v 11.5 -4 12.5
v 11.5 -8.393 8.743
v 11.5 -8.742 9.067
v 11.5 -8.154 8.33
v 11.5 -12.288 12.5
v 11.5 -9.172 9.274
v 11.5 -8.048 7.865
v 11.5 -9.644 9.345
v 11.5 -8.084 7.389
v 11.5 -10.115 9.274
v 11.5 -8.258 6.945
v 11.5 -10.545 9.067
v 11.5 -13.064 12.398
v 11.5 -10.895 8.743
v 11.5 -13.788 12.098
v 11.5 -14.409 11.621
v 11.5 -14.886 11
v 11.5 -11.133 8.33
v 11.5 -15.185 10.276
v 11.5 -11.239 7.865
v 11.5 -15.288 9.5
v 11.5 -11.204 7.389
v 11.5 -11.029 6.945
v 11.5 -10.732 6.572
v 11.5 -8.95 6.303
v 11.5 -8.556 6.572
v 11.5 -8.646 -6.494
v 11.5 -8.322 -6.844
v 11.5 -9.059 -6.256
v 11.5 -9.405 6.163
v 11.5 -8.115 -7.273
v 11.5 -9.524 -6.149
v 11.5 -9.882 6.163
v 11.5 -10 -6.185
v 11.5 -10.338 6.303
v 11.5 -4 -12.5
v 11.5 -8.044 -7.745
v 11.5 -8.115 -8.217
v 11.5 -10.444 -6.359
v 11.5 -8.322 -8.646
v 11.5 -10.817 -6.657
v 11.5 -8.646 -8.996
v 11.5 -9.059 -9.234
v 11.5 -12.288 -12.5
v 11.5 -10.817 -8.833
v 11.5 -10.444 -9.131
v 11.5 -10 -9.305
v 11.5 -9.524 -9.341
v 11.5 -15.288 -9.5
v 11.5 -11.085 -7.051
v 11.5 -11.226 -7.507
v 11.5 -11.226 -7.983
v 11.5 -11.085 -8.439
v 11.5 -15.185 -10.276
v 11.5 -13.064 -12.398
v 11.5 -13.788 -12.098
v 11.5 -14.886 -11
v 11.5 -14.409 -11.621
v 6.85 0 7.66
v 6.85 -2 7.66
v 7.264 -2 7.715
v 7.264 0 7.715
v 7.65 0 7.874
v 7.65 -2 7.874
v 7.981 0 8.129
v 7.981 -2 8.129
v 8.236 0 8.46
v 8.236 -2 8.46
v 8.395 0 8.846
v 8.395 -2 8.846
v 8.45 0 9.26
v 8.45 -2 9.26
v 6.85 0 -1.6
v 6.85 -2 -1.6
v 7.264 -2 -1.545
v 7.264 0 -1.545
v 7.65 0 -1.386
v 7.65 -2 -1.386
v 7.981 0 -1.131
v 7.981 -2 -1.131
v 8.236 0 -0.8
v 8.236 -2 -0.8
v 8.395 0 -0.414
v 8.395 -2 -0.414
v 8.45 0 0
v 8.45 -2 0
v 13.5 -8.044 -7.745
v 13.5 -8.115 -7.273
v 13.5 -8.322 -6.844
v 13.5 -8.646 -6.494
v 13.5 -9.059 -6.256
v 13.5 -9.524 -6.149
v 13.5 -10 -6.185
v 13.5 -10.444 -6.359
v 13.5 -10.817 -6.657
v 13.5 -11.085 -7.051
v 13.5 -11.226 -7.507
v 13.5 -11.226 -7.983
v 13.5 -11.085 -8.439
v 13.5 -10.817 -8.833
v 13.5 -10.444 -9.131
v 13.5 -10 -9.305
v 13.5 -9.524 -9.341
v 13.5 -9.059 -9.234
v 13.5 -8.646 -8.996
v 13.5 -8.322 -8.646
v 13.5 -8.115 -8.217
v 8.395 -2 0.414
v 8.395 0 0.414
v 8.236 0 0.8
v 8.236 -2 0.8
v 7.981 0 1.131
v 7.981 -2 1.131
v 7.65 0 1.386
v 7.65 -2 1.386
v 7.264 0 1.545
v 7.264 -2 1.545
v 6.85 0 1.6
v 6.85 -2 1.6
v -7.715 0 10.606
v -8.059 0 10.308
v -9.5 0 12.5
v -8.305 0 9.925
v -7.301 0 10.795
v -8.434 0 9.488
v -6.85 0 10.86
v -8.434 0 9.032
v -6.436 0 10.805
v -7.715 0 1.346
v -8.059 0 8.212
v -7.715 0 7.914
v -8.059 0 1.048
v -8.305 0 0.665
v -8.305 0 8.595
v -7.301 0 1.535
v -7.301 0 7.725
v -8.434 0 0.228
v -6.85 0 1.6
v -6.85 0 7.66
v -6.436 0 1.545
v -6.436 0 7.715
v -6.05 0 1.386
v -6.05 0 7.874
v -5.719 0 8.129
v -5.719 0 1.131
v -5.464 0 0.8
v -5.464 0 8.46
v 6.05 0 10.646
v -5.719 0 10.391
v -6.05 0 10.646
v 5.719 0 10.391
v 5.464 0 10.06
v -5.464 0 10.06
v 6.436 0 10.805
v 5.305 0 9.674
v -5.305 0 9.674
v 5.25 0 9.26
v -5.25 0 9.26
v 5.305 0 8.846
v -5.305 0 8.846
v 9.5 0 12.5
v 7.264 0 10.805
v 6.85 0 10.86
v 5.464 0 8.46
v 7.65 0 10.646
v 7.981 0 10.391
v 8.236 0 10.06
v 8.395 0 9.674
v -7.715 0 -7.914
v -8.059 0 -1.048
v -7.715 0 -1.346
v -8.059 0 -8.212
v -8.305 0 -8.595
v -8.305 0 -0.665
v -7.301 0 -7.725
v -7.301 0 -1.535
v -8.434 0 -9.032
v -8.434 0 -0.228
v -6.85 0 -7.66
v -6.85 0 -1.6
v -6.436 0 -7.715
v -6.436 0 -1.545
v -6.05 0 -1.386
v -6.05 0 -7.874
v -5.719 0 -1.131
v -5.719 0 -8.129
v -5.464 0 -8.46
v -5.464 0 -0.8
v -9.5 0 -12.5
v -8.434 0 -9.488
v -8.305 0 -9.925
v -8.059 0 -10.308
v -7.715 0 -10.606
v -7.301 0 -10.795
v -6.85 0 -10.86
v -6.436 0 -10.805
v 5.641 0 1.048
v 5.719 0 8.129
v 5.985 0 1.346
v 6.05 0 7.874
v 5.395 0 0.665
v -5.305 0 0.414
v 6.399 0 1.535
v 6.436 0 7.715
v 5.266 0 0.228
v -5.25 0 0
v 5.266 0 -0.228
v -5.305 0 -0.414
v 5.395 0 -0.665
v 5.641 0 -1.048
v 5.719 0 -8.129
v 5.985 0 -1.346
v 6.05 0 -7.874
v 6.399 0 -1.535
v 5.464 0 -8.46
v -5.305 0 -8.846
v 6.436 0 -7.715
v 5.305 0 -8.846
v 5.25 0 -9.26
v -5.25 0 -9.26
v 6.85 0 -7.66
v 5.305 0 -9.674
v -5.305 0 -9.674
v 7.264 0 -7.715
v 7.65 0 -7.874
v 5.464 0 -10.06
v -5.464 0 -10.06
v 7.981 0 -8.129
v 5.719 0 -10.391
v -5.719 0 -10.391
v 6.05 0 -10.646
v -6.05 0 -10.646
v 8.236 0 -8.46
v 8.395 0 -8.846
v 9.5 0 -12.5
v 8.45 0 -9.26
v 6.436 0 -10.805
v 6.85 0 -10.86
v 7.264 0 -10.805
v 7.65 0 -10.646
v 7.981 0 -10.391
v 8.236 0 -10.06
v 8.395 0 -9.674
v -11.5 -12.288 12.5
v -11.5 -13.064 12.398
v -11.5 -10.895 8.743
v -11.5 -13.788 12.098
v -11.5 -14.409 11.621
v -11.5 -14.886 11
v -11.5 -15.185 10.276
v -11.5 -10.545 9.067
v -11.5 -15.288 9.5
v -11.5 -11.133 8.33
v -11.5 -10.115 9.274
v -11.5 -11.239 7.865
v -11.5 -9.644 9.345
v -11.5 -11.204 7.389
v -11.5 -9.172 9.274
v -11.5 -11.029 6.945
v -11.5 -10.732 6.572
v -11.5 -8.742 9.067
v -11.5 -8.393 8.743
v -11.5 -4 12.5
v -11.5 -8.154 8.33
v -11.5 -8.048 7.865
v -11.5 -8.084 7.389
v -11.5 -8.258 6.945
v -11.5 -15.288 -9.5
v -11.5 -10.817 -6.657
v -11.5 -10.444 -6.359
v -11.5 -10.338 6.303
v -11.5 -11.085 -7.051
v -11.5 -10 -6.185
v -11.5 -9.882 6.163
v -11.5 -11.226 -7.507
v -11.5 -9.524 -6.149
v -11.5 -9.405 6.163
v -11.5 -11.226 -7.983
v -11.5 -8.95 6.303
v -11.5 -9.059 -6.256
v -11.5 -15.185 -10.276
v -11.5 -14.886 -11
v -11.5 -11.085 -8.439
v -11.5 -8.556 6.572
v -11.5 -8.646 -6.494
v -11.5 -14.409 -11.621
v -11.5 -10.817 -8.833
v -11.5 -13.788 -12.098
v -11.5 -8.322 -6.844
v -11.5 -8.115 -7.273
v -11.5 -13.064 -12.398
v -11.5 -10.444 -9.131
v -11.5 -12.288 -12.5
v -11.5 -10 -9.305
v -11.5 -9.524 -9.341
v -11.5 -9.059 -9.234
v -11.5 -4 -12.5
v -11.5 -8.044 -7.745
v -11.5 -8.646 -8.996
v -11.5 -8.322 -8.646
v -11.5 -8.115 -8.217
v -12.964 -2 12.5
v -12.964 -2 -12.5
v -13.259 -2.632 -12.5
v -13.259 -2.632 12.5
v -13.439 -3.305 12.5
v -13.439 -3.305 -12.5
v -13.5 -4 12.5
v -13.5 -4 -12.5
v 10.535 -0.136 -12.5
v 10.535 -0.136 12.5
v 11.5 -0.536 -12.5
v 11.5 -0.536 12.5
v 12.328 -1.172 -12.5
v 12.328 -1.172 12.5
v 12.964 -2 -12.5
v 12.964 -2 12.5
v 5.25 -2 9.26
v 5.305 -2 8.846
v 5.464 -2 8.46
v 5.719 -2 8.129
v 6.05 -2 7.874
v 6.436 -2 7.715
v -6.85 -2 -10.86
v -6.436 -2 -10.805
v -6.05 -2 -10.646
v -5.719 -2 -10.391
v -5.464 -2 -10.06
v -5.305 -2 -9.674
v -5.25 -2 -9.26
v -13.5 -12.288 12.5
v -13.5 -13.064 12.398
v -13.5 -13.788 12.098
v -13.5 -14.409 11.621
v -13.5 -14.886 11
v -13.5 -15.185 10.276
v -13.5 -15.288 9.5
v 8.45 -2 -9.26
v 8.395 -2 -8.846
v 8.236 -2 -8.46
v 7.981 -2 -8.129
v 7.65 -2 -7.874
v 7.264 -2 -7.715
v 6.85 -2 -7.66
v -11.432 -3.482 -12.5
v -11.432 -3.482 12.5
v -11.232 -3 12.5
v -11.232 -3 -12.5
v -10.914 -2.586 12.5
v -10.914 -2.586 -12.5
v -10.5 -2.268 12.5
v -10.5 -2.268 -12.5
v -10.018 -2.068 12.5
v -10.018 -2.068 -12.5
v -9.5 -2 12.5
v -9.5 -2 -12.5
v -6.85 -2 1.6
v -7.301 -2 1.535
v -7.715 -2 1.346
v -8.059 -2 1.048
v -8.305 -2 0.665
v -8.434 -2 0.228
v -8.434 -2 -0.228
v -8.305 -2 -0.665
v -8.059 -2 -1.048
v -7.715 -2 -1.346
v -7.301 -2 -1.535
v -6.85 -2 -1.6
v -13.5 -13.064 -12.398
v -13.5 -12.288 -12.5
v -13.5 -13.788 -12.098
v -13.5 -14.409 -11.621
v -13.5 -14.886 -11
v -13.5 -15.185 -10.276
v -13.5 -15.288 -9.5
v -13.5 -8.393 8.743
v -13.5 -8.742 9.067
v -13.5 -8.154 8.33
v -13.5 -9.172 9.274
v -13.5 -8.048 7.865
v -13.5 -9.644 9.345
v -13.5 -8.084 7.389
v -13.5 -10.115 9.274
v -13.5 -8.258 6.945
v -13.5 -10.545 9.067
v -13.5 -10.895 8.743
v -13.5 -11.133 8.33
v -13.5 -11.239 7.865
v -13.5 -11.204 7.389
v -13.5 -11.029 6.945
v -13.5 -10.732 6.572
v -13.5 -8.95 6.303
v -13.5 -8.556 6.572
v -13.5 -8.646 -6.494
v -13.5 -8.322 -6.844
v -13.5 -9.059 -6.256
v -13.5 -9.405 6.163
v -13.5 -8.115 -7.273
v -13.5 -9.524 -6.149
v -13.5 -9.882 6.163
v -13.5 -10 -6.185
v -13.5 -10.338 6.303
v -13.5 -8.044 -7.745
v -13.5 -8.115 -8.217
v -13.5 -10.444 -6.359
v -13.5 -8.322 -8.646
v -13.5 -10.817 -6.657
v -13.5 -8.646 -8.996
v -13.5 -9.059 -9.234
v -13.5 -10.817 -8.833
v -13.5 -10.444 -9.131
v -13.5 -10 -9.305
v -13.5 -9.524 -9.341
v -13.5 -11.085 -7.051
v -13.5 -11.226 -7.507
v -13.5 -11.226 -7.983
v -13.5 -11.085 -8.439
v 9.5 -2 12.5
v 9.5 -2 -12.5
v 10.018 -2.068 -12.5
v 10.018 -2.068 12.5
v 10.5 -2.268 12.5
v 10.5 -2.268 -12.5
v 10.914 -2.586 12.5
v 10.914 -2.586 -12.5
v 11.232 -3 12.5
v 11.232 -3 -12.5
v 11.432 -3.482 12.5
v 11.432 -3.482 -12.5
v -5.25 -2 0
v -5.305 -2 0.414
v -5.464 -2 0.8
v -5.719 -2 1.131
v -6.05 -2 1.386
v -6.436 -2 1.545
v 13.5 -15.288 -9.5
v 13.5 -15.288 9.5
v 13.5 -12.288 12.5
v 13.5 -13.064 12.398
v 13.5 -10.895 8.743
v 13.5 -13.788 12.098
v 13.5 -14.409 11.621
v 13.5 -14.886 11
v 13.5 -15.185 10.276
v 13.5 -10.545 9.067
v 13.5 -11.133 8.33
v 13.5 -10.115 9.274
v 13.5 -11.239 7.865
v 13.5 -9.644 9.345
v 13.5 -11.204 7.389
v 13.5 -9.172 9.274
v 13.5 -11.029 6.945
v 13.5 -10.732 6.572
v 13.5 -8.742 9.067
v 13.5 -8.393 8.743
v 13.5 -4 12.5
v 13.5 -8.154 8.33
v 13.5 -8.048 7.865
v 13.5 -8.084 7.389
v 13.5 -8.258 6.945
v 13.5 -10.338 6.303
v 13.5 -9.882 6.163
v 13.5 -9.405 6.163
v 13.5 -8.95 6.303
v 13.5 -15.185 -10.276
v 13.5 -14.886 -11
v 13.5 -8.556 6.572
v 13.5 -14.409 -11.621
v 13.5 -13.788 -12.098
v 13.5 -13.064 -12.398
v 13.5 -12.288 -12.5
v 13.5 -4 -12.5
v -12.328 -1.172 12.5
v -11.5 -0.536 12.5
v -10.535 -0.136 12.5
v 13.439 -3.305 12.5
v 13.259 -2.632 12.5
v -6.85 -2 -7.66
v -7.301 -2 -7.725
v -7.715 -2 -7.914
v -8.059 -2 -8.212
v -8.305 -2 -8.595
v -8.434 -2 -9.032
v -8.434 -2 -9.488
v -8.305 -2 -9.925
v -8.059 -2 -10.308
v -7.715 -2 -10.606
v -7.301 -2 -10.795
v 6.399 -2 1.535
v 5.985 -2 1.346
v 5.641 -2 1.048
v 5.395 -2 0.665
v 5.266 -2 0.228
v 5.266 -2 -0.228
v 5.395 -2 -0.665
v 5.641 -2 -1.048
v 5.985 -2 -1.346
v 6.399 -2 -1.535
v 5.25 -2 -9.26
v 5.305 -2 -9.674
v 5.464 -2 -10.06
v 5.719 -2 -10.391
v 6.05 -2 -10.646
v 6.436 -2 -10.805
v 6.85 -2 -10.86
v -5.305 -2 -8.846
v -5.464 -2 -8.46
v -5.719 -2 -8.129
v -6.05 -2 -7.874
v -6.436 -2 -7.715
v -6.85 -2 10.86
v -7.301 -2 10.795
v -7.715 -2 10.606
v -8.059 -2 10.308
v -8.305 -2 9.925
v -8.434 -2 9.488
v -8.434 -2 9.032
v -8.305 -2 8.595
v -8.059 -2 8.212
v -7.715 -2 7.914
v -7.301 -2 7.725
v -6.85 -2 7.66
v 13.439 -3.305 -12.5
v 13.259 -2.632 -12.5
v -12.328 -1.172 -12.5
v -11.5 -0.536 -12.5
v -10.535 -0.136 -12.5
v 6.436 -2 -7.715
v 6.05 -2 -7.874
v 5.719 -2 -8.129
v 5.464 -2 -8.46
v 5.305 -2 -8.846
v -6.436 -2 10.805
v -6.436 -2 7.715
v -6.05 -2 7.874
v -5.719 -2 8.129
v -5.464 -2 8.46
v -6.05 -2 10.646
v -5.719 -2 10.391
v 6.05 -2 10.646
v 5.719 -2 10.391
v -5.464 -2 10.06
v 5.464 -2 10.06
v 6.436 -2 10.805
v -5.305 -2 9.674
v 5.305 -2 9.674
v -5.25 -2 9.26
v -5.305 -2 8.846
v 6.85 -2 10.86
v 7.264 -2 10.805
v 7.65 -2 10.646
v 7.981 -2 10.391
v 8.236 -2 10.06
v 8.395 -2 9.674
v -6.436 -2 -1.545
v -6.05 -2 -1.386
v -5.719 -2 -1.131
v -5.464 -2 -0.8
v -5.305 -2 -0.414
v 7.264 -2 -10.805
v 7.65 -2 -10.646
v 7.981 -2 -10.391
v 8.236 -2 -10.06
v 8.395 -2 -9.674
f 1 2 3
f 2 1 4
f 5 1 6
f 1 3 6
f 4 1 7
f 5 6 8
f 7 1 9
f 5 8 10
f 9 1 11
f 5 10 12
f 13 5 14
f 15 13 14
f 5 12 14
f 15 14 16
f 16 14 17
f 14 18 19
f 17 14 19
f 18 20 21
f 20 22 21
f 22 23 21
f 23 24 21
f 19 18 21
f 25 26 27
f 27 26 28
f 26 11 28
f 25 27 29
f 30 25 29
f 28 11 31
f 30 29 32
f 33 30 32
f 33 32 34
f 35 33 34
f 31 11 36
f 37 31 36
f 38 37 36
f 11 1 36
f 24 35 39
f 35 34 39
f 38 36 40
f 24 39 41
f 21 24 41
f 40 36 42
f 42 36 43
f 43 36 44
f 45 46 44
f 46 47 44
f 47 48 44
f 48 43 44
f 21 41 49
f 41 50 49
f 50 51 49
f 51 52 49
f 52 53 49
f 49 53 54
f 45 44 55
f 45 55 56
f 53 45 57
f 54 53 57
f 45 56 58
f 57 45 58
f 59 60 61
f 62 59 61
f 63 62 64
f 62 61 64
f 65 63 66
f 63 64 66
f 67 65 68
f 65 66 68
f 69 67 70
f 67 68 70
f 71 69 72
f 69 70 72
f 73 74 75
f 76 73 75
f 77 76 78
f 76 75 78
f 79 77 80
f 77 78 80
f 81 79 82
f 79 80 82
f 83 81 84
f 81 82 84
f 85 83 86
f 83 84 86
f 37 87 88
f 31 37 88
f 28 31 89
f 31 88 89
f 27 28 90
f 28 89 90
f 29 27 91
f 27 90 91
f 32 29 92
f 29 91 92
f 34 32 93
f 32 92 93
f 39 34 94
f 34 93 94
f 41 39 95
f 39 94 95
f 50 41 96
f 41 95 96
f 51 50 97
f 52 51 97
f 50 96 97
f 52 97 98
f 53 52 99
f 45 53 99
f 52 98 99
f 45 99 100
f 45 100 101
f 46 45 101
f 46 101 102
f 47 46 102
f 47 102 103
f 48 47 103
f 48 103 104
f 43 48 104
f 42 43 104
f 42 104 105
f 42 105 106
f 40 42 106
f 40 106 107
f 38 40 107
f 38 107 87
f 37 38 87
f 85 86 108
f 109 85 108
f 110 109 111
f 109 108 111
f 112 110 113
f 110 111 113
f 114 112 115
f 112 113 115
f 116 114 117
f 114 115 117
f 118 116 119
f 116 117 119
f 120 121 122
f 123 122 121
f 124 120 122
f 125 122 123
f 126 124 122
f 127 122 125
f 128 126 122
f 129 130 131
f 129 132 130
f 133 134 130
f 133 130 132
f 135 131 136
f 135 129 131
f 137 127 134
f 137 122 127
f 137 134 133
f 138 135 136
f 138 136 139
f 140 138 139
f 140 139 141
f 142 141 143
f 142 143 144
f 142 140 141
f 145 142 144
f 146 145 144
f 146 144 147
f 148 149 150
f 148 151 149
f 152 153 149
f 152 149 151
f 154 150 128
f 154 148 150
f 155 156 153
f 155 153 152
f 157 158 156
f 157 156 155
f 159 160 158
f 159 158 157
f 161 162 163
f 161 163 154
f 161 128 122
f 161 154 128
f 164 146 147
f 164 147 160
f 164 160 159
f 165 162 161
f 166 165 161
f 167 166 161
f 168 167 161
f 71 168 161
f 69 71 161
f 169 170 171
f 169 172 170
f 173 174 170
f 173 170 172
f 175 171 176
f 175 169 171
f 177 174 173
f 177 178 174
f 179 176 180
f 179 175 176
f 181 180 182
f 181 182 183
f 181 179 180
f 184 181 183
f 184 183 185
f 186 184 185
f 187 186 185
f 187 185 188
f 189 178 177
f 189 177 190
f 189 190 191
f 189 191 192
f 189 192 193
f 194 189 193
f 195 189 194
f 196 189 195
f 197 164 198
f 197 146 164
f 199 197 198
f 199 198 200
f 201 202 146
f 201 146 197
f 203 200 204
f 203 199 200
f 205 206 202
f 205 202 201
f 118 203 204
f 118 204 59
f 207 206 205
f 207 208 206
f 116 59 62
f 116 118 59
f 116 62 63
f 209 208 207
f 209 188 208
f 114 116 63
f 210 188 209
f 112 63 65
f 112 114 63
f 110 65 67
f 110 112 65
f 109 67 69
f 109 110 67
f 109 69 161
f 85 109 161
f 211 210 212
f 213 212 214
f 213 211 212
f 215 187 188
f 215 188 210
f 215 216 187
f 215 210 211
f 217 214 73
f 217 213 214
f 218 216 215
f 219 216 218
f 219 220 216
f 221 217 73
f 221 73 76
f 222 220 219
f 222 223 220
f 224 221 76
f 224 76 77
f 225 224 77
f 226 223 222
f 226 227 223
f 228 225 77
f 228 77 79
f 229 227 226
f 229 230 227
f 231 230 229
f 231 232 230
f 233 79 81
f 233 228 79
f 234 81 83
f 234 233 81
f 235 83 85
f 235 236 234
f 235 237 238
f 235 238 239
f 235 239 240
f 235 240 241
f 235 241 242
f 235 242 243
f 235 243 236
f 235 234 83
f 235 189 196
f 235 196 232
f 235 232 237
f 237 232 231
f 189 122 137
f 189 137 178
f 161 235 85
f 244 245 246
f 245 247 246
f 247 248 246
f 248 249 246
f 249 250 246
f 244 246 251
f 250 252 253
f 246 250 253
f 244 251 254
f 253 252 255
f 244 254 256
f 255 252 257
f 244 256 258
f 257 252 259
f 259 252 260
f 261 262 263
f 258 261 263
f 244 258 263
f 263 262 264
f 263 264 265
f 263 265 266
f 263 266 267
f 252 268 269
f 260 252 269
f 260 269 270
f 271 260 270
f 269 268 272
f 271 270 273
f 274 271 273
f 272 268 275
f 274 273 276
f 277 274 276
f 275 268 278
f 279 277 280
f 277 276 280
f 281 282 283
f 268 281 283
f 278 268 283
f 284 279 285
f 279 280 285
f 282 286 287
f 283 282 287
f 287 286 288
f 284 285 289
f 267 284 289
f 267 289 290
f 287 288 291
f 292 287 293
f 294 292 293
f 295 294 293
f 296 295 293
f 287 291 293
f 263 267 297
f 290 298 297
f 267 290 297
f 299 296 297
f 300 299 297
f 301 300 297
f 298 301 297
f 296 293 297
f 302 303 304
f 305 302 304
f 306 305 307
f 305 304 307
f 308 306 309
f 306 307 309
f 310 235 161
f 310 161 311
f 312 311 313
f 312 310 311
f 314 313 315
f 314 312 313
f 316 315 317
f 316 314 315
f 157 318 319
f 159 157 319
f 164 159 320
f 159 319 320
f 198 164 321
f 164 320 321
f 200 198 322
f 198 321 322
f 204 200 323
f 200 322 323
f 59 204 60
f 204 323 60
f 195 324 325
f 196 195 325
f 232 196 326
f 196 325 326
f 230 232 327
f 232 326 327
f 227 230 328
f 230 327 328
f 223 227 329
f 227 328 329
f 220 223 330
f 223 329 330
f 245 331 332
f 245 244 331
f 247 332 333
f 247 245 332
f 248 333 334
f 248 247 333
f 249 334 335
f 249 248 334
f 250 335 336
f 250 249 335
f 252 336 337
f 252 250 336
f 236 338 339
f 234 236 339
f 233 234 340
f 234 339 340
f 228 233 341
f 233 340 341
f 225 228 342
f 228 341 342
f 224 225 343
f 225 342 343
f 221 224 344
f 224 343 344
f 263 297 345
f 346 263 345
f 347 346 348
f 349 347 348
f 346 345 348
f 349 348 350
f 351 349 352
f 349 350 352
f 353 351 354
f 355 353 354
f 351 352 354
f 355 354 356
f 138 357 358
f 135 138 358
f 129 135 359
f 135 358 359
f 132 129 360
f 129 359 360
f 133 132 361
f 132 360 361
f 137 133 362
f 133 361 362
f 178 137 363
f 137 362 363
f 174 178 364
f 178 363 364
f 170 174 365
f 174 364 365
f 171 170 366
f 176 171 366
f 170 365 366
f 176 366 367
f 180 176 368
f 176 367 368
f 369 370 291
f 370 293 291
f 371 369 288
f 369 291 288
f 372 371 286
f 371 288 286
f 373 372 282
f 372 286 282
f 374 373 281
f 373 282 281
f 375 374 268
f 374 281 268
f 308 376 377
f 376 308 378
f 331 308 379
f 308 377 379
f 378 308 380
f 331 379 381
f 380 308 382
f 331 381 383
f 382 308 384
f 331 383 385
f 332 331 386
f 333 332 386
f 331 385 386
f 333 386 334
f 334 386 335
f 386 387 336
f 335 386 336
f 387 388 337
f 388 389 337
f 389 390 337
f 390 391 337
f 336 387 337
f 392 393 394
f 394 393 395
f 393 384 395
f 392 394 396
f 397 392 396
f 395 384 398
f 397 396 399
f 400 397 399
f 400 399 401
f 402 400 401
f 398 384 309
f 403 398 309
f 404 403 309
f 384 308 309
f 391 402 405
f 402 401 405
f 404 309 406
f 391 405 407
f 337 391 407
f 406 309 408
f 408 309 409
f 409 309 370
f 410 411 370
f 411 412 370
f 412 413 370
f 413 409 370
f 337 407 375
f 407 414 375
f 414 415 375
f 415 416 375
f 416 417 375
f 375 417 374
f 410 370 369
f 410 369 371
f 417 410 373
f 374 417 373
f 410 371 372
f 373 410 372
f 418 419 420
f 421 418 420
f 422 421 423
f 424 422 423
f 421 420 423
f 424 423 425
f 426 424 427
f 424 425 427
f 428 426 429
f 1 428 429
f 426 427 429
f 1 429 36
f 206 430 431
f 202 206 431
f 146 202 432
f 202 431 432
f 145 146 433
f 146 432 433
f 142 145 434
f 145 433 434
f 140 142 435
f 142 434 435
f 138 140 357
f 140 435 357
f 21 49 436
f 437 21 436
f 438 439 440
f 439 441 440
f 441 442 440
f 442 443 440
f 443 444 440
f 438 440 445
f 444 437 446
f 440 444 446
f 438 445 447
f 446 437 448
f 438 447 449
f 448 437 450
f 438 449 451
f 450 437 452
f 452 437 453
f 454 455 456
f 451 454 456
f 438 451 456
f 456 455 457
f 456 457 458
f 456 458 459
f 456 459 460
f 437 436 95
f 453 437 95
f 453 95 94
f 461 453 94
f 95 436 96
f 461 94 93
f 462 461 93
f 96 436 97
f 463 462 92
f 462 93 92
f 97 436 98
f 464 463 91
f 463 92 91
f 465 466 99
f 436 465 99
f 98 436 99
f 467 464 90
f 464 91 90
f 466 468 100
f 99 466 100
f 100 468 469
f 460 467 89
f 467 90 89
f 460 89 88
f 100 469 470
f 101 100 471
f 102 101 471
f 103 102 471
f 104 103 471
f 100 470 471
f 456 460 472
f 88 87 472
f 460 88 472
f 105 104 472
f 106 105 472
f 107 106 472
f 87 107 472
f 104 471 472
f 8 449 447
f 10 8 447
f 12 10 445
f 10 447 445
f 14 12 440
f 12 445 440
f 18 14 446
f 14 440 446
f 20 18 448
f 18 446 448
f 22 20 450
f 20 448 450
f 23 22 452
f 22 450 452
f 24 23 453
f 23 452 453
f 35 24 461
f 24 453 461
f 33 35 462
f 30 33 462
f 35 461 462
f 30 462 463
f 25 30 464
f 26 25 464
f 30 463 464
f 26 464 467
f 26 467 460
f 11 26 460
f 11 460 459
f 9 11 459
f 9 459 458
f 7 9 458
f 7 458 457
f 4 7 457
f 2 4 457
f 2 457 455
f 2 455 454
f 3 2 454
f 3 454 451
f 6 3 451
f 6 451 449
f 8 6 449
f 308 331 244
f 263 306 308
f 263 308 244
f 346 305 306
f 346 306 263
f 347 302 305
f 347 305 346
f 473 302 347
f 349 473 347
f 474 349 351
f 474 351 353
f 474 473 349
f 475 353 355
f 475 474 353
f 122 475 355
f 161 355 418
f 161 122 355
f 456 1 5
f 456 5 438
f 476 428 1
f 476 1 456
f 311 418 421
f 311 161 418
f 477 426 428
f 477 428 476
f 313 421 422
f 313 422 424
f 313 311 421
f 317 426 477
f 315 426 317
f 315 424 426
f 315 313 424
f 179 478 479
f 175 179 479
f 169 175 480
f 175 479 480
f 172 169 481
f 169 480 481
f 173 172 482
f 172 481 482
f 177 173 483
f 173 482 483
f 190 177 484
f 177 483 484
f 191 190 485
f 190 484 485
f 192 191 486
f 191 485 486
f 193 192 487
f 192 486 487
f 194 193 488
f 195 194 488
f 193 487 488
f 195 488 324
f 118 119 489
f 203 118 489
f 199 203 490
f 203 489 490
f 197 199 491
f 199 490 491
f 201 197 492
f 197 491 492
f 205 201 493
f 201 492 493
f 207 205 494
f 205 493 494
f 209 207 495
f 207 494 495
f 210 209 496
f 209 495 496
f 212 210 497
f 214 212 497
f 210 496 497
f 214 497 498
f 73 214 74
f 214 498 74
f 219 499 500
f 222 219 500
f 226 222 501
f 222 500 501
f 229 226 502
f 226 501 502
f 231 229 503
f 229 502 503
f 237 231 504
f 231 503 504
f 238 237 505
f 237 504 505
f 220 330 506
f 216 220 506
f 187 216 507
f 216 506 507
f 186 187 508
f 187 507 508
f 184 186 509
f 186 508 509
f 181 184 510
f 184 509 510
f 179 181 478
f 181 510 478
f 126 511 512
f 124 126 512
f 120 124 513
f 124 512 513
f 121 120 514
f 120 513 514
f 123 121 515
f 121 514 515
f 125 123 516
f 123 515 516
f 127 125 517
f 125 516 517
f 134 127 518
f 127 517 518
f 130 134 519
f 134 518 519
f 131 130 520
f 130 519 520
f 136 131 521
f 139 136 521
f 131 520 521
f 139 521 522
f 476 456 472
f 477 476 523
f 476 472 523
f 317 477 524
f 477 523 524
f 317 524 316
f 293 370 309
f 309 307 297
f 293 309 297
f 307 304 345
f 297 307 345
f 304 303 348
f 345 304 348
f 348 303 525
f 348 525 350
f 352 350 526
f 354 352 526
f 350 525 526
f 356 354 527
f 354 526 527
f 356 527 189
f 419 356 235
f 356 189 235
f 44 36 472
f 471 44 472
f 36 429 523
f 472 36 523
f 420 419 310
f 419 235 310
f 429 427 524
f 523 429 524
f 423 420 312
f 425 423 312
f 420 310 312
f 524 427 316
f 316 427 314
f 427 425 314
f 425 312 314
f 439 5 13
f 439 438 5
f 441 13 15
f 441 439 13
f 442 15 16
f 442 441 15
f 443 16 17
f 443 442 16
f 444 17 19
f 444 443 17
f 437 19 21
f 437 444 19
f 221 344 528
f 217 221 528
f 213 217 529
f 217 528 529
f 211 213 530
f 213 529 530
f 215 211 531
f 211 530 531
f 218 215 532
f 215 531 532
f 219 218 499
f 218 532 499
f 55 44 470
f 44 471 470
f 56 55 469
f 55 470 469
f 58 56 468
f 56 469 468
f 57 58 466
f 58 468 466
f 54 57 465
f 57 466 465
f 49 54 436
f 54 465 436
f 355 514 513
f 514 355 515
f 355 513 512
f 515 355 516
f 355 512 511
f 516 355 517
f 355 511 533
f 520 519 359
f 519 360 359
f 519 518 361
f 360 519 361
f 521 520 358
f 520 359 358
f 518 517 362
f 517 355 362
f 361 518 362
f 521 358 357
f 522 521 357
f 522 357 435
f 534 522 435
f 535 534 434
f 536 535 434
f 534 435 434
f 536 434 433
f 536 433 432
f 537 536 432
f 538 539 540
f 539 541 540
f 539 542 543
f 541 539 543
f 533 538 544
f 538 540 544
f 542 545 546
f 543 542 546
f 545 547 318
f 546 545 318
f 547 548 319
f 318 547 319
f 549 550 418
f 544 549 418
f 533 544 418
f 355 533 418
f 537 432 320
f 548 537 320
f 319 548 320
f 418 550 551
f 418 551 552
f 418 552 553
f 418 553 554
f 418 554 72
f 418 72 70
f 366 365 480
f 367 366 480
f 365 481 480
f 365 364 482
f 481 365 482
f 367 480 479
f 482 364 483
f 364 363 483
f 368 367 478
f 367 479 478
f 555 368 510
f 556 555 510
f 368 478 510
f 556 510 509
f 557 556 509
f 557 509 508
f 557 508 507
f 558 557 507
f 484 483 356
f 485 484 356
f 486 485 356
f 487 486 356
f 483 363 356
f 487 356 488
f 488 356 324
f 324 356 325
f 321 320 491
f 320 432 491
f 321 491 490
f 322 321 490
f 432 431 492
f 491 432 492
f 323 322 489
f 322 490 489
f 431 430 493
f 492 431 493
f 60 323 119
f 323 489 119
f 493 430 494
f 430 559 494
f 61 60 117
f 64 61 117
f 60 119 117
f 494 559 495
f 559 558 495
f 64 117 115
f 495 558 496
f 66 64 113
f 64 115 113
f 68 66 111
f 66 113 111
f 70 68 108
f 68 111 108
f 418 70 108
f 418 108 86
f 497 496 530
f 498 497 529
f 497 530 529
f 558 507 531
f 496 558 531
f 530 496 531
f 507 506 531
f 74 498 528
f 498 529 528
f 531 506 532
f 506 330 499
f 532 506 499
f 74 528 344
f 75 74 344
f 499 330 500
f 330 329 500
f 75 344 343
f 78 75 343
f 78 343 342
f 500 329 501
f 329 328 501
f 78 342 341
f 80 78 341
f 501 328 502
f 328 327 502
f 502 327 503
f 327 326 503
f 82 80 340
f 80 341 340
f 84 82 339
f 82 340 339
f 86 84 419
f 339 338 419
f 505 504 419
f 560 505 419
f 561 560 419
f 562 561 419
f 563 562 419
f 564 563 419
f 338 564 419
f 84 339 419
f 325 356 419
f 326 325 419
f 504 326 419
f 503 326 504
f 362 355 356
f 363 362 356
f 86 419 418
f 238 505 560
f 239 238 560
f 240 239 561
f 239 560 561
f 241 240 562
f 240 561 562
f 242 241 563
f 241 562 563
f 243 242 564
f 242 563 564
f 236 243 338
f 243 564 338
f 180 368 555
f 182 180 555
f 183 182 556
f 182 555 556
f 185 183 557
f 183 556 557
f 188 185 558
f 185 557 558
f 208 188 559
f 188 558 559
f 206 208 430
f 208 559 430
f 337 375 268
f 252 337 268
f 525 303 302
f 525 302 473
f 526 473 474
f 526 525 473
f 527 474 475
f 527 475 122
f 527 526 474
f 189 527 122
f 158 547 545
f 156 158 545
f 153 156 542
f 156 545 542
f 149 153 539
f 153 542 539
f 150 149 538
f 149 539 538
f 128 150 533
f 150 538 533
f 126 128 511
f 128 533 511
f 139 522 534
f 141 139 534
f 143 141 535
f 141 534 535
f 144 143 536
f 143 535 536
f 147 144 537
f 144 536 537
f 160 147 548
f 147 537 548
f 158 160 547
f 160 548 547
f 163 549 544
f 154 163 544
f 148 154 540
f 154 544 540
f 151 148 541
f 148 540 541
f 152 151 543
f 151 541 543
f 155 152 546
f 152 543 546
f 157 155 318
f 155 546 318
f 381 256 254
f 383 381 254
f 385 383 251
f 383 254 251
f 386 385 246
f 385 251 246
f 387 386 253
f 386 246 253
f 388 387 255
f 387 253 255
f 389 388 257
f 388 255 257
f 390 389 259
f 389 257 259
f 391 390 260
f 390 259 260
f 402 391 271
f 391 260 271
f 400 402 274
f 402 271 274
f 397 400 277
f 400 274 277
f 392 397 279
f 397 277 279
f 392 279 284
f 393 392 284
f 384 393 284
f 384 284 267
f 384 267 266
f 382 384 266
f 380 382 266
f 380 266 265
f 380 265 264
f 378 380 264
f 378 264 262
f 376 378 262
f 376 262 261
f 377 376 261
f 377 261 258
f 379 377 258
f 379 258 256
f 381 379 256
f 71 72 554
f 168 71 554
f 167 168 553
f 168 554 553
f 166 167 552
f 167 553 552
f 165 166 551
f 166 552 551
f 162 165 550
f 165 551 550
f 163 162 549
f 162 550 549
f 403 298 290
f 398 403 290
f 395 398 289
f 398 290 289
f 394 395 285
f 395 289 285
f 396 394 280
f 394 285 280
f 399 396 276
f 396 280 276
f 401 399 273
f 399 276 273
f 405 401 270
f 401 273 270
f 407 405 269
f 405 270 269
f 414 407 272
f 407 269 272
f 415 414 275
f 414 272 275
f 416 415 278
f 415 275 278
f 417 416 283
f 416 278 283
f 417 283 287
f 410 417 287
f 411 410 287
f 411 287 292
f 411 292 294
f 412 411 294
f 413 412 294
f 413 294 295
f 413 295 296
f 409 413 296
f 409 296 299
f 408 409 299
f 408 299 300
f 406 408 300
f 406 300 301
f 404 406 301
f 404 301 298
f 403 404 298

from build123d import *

# Parameters (mm, degrees)
SKETCH_1_W             = 51
SKETCH_1_H             = 25
SM_BASE_FLANGE_3_DEPTH = 2
OTHER_START            = -12.5
OTHER_3_DEPTH          = 25
OTHER_3_2_DEPTH        = 25
OTHER_4_DEPTH          = 25
OTHER_4_2_DEPTH        = 25
SKETCH_20_R            = 1.6
CUT_EXTRUDE_1_DEPTH    = 40
CUT_EXTRUDE_2_DEPTH    = 40
FILLET_1_R             = 3


# Read off the part's stored shape, not the designer's step: 绘制的折弯3, 绘制的折弯4
# Sheet-metal steps are written as plain solids
with BuildPart() as part:
    # 草图1 → 基体-法兰3 (new body)
    with BuildSketch(Plane(origin=(0, 0, 0), x_dir=(1, 0, 0), z_dir=(0, 1, 0))):
        Rectangle(SKETCH_1_W, SKETCH_1_H)
    extrude(amount=-SM_BASE_FLANGE_3_DEPTH)

    # Other 3 outline → Other 3 (cut)
    with BuildSketch(Plane.XY.offset(OTHER_START)):
        with BuildLine():
            Line((-25.5, -2), (-12.964101616, -2))
            ThreePointArc((-12.964101616, -2), (-11.5, -0.535898385), (-9.5, 0))
            Line((-9.5, 0), (-25.5, 0))
            Line((-25.5, 0), (-25.5, -2))
        make_face()
    extrude(amount=OTHER_3_DEPTH, mode=Mode.SUBTRACT)

    # Other 3 2 outline → Other 3 2 (add)
    with BuildSketch(Plane.XY.offset(OTHER_START)):
        with BuildLine():
            Line((-13.5, -15.28761102), (-11.5, -15.28761102))
            Line((-11.5, -15.28761102), (-11.5, -4))
            ThreePointArc((-11.5, -4), (-10.914213562, -2.585786438), (-9.5, -2))
            Line((-9.5, -2), (-12.964101616, -2))
            ThreePointArc((-12.964101616, -2), (-13.363703305, -2.96472382), (-13.5, -4))
            Line((-13.5, -4), (-13.5, -15.28761102))
        make_face()
    extrude(amount=OTHER_3_2_DEPTH)

    # Other 4 outline → Other 4 (cut)
    with BuildSketch(Plane.XY.offset(OTHER_START)):
        with BuildLine():
            ThreePointArc((9.5, 0), (11.5, -0.535898385), (12.964101616, -2))
            Line((12.964101616, -2), (25.5, -2))
            Line((25.5, -2), (25.5, 0))
            Line((25.5, 0), (9.5, 0))
        make_face()
    extrude(amount=OTHER_4_DEPTH, mode=Mode.SUBTRACT)

    # Other 4 2 outline → Other 4 2 (add)
    with BuildSketch(Plane.XY.offset(OTHER_START)):
        with BuildLine():
            Line((11.5, -4), (11.5, -15.28761102))
            Line((11.5, -15.28761102), (13.5, -15.28761102))
            Line((13.5, -15.28761102), (13.5, -4))
            ThreePointArc((13.5, -4), (13.363703305, -2.96472382), (12.964101616, -2))
            Line((12.964101616, -2), (9.5, -2))
            ThreePointArc((9.5, -2), (10.914213562, -2.585786438), (11.5, -4))
        make_face()
    extrude(amount=OTHER_4_2_DEPTH)

    # 草图20 → 切除-拉伸1 (cut)
    with BuildSketch(Plane(origin=(13.5, 0, 0), x_dir=(0, 0, -1), z_dir=(1, 0, 0))):
        with BuildLine():
            Line((-9.345, -9.64380551), (-7.745, -9.64380551))
            Line((-7.745, -9.64380551), (-6.145, -9.64380551))
            ThreePointArc((-6.145, -9.64380551), (-7.745, -8.04380551), (-9.345, -9.64380551))
        make_face()
        with BuildLine():
            Line((-6.145, -9.64380551), (-7.745, -9.64380551))
            Line((-7.745, -9.64380551), (-9.345, -9.64380551))
            ThreePointArc((-9.345, -9.64380551), (-7.745, -11.24380551), (-6.145, -9.64380551))
        make_face()
        with Locations(Location((7.745, -9.64380551, 0), (0, 0, 90))):
            Circle(SKETCH_20_R)
    extrude(amount=-CUT_EXTRUDE_1_DEPTH, mode=Mode.SUBTRACT)

    # 草图21 → 切除-拉伸2 (cut)
    with BuildSketch(Plane.XZ.offset(2)):
        with BuildLine():
            ThreePointArc((-5.25, 9.26), (-5.71862915, 10.39137085), (-6.85, 10.86))
            Line((-6.85, 10.86), (-6.85, 9.26))
            Line((-6.85, 9.26), (-5.25, 9.26))
        make_face()
        with BuildLine():
            Line((-5.25, 9.26), (-6.85, 9.26))
            Line((-6.85, 9.26), (-6.85, 7.66))
            ThreePointArc((-6.85, 7.66), (-5.71862915, 8.12862915), (-5.25, 9.26))
        make_face()
        with BuildLine():
            Line((-6.85, 9.26), (-6.85, 10.86))
            ThreePointArc((-6.85, 10.86), (-8.45, 9.26), (-6.85, 7.66))
            Line((-6.85, 7.66), (-6.85, 9.26))
        make_face()
        with BuildLine():
            Line((6.85, 9.26), (6.85, 10.86))
            ThreePointArc((6.85, 10.86), (5.71862915, 10.39137085), (5.25, 9.26))
            Line((5.25, 9.26), (6.85, 9.26))
        make_face()
        with BuildLine():
            Line((6.85, 7.66), (6.85, 9.26))
            Line((6.85, 9.26), (5.25, 9.26))
            ThreePointArc((5.25, 9.26), (5.71862915, 8.12862915), (6.85, 7.66))
        make_face()
        with BuildLine():
            ThreePointArc((8.45, 9.26), (7.98137085, 10.39137085), (6.85, 10.86))
            Line((6.85, 10.86), (6.85, 9.26))
            Line((6.85, 9.26), (6.85, 7.66))
            ThreePointArc((6.85, 7.66), (7.98137085, 8.12862915), (8.45, 9.26))
        make_face()
        with BuildLine():
            ThreePointArc((8.45, 0), (7.98137085, 1.13137085), (6.85, 1.6))
            Line((6.85, 1.6), (6.85, 0))
            Line((6.85, 0), (6.85, -1.6))
            ThreePointArc((6.85, -1.6), (7.98137085, -1.13137085), (8.45, 0))
        make_face()
        with BuildLine():
            Line((6.85, 0), (6.85, 1.6))
            ThreePointArc((6.85, 1.6), (5.25, 0), (6.85, -1.6))
            Line((6.85, -1.6), (6.85, 0))
        make_face()
        with BuildLine():
            ThreePointArc((-5.25, 0), (-5.71862915, 1.13137085), (-6.85, 1.6))
            Line((-6.85, 1.6), (-6.85, -1.6))
            ThreePointArc((-6.85, -1.6), (-5.71862915, -1.13137085), (-5.25, 0))
        make_face()
        with BuildLine():
            Line((-6.85, -1.6), (-6.85, 1.6))
            ThreePointArc((-6.85, 1.6), (-8.45, 0), (-6.85, -1.6))
        make_face()
        with BuildLine():
            ThreePointArc((-5.25, -9.26), (-5.71862915, -8.12862915), (-6.85, -7.66))
            Line((-6.85, -7.66), (-6.85, -9.26))
            Line((-6.85, -9.26), (-5.25, -9.26))
        make_face()
        with BuildLine():
            Line((-5.25, -9.26), (-6.85, -9.26))
            Line((-6.85, -9.26), (-6.85, -10.86))
            ThreePointArc((-6.85, -10.86), (-5.71862915, -10.39137085), (-5.25, -9.26))
        make_face()
        with BuildLine():
            Line((-6.85, -9.26), (-6.85, -7.66))
            ThreePointArc((-6.85, -7.66), (-8.45, -9.26), (-6.85, -10.86))
            Line((-6.85, -10.86), (-6.85, -9.26))
        make_face()
        with BuildLine():
            ThreePointArc((8.45, -9.26), (7.98137085, -8.12862915), (6.85, -7.66))
            Line((6.85, -7.66), (6.85, -9.26))
            Line((6.85, -9.26), (6.85, -10.86))
            ThreePointArc((6.85, -10.86), (7.98137085, -10.39137085), (8.45, -9.26))
        make_face()
        with BuildLine():
            Line((6.85, -9.26), (6.85, -7.66))
            ThreePointArc((6.85, -7.66), (5.71862915, -8.12862915), (5.25, -9.26))
            Line((5.25, -9.26), (6.85, -9.26))
        make_face()
        with BuildLine():
            Line((6.85, -10.86), (6.85, -9.26))
            Line((6.85, -9.26), (5.25, -9.26))
            ThreePointArc((5.25, -9.26), (5.71862915, -10.39137085), (6.85, -10.86))
        make_face()
    extrude(amount=-CUT_EXTRUDE_2_DEPTH, mode=Mode.SUBTRACT)

    # 圆角1
    fillet_1_edges = [part.edges().sort_by_distance(p)[0] for p in [
        (-12.5, -15.28761102, 12.5),
        (-12.5, -15.28761102, -12.5),
        (12.5, -15.28761102, -12.5),
        (12.5, -15.28761102, 12.5),
    ]]
    fillet(fillet_1_edges, radius=FILLET_1_R)


solid = part.part
